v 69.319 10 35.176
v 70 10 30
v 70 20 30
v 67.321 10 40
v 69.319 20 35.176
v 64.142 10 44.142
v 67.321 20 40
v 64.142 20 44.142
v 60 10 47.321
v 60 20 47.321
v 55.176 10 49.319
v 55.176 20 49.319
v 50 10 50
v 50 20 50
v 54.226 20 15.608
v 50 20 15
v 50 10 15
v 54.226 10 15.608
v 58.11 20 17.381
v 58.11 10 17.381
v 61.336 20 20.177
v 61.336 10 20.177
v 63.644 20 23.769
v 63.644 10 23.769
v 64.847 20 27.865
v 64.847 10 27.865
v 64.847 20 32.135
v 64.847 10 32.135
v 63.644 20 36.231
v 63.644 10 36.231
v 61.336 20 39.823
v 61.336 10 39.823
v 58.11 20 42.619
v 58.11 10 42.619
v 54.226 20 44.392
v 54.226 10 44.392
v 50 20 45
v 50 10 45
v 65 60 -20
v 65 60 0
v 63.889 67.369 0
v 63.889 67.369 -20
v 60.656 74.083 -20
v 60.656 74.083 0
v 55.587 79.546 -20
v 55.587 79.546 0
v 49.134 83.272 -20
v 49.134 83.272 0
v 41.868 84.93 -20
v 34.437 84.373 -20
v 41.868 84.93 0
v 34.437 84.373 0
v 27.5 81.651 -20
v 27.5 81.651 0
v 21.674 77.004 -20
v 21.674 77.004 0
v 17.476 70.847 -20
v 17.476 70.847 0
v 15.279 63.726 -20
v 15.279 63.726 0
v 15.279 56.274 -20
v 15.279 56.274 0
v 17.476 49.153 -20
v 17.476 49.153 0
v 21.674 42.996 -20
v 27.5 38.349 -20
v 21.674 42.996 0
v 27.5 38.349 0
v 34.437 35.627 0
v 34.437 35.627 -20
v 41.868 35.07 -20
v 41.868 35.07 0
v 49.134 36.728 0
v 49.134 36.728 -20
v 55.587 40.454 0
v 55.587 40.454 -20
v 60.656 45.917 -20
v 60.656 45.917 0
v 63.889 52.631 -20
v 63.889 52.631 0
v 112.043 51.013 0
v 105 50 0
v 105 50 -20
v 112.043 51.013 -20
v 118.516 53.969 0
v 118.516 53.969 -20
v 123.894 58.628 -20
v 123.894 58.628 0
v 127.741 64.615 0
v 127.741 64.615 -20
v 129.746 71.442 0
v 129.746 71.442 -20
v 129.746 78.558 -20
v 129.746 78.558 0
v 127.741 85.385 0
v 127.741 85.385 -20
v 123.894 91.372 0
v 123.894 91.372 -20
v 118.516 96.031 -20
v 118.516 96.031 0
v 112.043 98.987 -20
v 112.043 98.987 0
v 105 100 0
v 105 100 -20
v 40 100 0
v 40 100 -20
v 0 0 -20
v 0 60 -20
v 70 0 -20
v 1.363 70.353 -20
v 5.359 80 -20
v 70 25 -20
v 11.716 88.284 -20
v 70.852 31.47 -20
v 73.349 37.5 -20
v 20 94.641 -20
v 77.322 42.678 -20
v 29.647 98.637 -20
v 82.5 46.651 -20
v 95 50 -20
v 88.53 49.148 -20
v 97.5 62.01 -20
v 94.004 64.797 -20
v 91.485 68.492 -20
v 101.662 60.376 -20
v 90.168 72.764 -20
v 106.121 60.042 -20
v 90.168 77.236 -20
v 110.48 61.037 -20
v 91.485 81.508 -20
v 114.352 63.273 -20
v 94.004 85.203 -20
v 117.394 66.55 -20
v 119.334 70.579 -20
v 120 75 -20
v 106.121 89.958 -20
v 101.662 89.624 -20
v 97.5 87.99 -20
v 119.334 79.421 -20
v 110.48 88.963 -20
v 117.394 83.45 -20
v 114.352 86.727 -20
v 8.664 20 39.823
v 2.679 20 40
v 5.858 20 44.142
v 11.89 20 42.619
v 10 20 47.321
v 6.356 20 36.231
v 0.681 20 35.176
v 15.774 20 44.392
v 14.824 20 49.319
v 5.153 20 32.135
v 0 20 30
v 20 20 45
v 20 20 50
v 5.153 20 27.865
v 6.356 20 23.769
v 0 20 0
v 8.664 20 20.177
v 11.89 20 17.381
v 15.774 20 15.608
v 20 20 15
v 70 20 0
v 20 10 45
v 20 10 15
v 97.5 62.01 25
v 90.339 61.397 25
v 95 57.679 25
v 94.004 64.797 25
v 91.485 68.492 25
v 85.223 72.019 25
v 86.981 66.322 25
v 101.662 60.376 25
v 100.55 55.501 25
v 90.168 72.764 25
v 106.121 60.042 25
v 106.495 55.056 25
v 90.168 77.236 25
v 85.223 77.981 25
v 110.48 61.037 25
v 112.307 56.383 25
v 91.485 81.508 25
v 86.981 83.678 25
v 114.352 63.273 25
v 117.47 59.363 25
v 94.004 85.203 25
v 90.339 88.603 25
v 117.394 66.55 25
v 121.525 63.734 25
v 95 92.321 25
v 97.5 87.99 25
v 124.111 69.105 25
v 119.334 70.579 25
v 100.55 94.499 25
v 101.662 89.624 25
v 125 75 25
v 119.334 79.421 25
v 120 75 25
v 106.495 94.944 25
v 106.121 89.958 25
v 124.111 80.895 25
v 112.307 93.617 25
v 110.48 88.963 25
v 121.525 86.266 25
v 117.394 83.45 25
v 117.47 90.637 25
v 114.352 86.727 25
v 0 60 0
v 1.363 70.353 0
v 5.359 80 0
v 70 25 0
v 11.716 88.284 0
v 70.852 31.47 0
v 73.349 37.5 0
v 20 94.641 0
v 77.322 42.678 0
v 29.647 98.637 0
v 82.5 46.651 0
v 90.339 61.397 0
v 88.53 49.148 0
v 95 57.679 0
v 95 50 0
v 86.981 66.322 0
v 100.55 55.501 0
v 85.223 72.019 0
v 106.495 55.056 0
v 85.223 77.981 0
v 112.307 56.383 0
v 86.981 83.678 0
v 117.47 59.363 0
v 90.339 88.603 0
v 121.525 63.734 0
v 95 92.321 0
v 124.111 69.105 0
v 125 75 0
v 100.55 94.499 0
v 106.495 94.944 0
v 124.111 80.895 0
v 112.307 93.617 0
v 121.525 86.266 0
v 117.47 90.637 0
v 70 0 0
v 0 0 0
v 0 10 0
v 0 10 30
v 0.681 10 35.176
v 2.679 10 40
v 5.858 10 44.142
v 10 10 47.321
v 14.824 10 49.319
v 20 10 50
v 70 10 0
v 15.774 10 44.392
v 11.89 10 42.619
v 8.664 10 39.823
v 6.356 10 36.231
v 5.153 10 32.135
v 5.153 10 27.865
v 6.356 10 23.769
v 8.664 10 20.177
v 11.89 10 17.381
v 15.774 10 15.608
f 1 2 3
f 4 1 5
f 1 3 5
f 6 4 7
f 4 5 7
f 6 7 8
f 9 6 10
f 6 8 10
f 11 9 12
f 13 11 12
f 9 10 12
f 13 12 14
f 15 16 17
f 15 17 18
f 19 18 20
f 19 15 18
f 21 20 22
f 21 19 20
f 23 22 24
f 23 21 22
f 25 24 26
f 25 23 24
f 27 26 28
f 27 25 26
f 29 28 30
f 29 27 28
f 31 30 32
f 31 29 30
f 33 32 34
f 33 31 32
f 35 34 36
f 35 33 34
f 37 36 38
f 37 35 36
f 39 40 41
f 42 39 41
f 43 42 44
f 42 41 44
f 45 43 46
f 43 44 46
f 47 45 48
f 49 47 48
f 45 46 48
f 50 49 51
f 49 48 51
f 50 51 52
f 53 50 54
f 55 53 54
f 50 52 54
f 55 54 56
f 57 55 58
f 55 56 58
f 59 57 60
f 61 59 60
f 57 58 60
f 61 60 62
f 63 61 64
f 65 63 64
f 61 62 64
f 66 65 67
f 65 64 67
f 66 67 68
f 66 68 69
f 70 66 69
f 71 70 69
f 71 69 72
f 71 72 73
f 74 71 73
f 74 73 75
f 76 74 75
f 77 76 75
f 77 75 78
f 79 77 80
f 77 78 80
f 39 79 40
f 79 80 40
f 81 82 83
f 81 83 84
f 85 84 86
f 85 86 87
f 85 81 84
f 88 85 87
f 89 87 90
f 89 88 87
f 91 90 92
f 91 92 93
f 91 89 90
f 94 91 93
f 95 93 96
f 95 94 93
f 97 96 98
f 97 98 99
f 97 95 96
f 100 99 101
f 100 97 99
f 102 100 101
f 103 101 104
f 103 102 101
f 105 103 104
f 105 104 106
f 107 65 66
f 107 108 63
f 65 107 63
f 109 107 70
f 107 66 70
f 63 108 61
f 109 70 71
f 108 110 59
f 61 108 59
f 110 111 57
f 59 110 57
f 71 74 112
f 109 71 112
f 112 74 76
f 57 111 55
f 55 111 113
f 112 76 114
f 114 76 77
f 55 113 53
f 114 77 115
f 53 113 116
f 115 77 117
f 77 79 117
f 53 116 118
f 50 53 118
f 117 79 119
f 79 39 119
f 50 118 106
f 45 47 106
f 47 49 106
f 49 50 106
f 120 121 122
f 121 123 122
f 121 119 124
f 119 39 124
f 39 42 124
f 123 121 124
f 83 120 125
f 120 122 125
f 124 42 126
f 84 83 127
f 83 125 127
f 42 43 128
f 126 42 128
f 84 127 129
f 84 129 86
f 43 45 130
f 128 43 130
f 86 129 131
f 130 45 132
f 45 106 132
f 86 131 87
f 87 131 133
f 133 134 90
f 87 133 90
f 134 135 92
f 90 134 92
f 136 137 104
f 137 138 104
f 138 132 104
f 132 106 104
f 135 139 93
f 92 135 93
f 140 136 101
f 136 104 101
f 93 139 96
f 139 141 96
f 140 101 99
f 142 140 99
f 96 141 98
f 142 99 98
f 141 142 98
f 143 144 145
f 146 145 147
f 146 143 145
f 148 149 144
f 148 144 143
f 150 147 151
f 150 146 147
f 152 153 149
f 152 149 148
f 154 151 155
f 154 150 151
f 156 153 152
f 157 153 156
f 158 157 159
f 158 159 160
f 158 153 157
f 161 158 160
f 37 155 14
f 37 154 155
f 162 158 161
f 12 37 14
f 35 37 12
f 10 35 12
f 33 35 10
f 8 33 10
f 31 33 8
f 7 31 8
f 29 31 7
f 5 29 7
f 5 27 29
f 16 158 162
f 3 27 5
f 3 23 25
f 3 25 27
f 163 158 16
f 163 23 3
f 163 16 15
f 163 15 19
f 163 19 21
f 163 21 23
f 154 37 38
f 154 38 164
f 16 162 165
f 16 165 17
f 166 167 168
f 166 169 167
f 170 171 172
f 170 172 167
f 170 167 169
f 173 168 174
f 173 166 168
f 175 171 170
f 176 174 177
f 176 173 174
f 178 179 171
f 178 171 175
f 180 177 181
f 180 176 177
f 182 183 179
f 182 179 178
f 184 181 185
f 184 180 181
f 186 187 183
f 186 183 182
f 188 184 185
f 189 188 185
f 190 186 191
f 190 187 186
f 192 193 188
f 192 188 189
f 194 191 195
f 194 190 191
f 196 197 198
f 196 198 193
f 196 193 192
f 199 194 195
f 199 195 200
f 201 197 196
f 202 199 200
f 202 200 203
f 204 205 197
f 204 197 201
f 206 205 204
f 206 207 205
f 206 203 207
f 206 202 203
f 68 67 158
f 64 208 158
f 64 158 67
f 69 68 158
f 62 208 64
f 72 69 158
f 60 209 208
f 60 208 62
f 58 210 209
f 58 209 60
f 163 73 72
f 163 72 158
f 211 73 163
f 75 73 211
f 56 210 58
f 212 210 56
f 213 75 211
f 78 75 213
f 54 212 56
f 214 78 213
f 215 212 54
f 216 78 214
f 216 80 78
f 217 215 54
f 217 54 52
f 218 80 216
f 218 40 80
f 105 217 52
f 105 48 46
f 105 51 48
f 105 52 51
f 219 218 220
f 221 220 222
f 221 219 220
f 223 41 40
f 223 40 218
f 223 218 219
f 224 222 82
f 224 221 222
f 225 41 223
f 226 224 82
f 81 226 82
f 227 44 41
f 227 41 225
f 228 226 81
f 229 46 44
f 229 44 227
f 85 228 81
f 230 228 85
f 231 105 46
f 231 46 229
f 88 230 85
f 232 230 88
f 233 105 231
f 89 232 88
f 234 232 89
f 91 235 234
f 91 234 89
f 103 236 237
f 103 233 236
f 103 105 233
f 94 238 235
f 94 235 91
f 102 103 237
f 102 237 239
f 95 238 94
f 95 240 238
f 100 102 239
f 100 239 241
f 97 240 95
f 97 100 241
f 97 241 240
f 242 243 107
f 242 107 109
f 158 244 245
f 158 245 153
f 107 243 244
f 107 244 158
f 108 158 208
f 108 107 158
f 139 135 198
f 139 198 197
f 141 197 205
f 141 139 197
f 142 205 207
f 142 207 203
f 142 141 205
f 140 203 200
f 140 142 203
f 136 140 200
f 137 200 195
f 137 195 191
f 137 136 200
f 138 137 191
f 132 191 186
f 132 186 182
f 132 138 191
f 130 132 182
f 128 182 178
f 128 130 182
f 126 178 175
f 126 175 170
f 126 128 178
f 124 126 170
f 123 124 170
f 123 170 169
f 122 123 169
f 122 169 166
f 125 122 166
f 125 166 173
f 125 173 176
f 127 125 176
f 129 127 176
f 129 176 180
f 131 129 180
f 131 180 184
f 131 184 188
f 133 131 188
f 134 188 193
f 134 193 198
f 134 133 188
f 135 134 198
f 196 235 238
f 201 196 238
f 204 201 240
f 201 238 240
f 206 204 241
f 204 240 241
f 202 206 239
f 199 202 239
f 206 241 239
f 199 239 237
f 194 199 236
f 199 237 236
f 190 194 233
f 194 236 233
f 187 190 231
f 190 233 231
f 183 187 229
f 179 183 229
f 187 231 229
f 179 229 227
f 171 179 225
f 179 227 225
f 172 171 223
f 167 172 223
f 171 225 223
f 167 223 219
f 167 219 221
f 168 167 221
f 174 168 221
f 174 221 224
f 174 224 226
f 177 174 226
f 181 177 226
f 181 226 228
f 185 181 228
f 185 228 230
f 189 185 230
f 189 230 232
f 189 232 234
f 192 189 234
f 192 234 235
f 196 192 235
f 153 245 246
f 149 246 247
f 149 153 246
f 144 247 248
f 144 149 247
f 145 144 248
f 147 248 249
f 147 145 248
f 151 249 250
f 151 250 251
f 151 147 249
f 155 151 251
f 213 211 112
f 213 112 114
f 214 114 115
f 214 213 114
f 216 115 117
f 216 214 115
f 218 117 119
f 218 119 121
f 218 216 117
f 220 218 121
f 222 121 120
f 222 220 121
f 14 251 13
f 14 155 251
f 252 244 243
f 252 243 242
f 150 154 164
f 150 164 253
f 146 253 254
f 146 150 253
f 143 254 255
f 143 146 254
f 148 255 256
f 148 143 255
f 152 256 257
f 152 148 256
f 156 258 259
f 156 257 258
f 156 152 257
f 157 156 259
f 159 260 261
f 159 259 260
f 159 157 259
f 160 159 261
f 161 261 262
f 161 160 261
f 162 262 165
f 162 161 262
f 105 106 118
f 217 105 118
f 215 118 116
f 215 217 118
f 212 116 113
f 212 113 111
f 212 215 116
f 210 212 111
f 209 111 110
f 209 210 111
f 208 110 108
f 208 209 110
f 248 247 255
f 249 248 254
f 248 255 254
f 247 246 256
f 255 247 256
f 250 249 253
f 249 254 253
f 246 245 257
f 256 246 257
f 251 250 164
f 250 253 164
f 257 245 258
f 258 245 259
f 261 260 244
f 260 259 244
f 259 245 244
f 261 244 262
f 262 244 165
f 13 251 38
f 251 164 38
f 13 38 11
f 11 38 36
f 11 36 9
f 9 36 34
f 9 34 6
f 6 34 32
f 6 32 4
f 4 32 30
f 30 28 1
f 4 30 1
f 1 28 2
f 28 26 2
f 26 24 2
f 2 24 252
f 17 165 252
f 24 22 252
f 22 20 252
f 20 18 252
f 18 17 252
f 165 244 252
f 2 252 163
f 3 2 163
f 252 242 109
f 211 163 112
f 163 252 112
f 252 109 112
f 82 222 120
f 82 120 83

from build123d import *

# Parameters (mm, degrees)
SKETCH1_R                = 25
SKETCH1_R_2              = 20
BOSS_EXTRUDE1_DEPTH      = 20
SKETCH1_W                = 70
SKETCH1_H                = 10
BOSS_EXTRUDE1_2_DEPTH    = 20
BOSS_EXTRUDE2_DEPTH      = 50
BOSS_EXTRUDE2_DEPTH_BACK = 20
SKETCH1_4_W              = 70
SKETCH1_4_H              = 10
BOSS_EXTRUDE3_DEPTH      = 25
BOSS_EXTRUDE3_DEPTH_BACK = 20
SKETCH1_5_R              = 20
SKETCH1_5_R_2            = 15
FILLET1_R                = 20
CUT_EXTRUDE1_DEPTH       = 161.623784042


with BuildPart() as part:
    # Sketch1 → Boss-Extrude1 (new body)
    with BuildSketch(Plane.XY):
        with BuildLine():
            Line((0, 60), (0, 20))
            Line((0, 20), (70, 20))
            Line((70, 20), (70, 25))
            ThreePointArc((70, 25), (77.32233047, 42.67766953), (95, 50))
            Line((95, 50), (105, 50))
            ThreePointArc((105, 50), (130, 75), (105, 100))
            Line((105, 100), (40, 100))
            ThreePointArc((40, 100), (11.715728753, 88.284271247), (0, 60))
        make_face()
        with Locations((40, 60)):
            Circle(SKETCH1_R, mode=Mode.SUBTRACT)
        with Locations((105, 75)):
            Circle(SKETCH1_R_2, mode=Mode.SUBTRACT)
    extrude(amount=-BOSS_EXTRUDE1_DEPTH)



with BuildPart() as body_2:
    # Sketch1 → Boss-Extrude1 2 (new body)
    with BuildSketch(Plane.XY):
        with Locations((35, 5)):
            Rectangle(SKETCH1_W, SKETCH1_H)
    extrude(amount=-BOSS_EXTRUDE1_2_DEPTH)


with BuildPart() as part_1:
    add(part.part)

    add(body_2.part)  # Boss-Extrude2 merges body 2
    # Sketch1<4> → Boss-Extrude2 (add, two sides: drawn at the far end of the back side and taken through both)
    with BuildSketch(Plane.XY.offset(-BOSS_EXTRUDE2_DEPTH_BACK)):
        with Locations((35, 15)):
            Rectangle(SKETCH1_4_W, SKETCH1_4_H)
    extrude(amount=BOSS_EXTRUDE2_DEPTH + BOSS_EXTRUDE2_DEPTH_BACK)

    # Sketch1<5> → Boss-Extrude3 (add, two sides: drawn at the far end of the back side and taken through both)
    with BuildSketch(Plane.XY.offset(-BOSS_EXTRUDE3_DEPTH_BACK)):
        with Locations((105, 75)):
            Circle(SKETCH1_5_R)
        with Locations((105, 75)):
            Circle(SKETCH1_5_R_2, mode=Mode.SUBTRACT)
    extrude(amount=BOSS_EXTRUDE3_DEPTH + BOSS_EXTRUDE3_DEPTH_BACK)

    # Fillet1
    fillet1_edges = [part_1.edges().sort_by_distance(p)[0] for p in [
        (70, 15, 50),
        (0, 15, 50),
    ]]
    fillet(fillet1_edges, radius=FILLET1_R)

    # Sketch2 → Cut-Extrude1 (cut, through all)
    with BuildSketch(Plane(origin=(0, 20, 0), x_dir=(1, 0, 0), z_dir=(0, 1, 0))):
        with BuildLine():
            Line((20, -15), (50, -15))
            ThreePointArc((50, -15), (65, -30), (50, -45))
            Line((50, -45), (20, -45))
            ThreePointArc((20, -45), (5, -30), (20, -15))
        make_face()
    extrude(amount=-CUT_EXTRUDE1_DEPTH, mode=Mode.SUBTRACT)


solid = part_1.part
